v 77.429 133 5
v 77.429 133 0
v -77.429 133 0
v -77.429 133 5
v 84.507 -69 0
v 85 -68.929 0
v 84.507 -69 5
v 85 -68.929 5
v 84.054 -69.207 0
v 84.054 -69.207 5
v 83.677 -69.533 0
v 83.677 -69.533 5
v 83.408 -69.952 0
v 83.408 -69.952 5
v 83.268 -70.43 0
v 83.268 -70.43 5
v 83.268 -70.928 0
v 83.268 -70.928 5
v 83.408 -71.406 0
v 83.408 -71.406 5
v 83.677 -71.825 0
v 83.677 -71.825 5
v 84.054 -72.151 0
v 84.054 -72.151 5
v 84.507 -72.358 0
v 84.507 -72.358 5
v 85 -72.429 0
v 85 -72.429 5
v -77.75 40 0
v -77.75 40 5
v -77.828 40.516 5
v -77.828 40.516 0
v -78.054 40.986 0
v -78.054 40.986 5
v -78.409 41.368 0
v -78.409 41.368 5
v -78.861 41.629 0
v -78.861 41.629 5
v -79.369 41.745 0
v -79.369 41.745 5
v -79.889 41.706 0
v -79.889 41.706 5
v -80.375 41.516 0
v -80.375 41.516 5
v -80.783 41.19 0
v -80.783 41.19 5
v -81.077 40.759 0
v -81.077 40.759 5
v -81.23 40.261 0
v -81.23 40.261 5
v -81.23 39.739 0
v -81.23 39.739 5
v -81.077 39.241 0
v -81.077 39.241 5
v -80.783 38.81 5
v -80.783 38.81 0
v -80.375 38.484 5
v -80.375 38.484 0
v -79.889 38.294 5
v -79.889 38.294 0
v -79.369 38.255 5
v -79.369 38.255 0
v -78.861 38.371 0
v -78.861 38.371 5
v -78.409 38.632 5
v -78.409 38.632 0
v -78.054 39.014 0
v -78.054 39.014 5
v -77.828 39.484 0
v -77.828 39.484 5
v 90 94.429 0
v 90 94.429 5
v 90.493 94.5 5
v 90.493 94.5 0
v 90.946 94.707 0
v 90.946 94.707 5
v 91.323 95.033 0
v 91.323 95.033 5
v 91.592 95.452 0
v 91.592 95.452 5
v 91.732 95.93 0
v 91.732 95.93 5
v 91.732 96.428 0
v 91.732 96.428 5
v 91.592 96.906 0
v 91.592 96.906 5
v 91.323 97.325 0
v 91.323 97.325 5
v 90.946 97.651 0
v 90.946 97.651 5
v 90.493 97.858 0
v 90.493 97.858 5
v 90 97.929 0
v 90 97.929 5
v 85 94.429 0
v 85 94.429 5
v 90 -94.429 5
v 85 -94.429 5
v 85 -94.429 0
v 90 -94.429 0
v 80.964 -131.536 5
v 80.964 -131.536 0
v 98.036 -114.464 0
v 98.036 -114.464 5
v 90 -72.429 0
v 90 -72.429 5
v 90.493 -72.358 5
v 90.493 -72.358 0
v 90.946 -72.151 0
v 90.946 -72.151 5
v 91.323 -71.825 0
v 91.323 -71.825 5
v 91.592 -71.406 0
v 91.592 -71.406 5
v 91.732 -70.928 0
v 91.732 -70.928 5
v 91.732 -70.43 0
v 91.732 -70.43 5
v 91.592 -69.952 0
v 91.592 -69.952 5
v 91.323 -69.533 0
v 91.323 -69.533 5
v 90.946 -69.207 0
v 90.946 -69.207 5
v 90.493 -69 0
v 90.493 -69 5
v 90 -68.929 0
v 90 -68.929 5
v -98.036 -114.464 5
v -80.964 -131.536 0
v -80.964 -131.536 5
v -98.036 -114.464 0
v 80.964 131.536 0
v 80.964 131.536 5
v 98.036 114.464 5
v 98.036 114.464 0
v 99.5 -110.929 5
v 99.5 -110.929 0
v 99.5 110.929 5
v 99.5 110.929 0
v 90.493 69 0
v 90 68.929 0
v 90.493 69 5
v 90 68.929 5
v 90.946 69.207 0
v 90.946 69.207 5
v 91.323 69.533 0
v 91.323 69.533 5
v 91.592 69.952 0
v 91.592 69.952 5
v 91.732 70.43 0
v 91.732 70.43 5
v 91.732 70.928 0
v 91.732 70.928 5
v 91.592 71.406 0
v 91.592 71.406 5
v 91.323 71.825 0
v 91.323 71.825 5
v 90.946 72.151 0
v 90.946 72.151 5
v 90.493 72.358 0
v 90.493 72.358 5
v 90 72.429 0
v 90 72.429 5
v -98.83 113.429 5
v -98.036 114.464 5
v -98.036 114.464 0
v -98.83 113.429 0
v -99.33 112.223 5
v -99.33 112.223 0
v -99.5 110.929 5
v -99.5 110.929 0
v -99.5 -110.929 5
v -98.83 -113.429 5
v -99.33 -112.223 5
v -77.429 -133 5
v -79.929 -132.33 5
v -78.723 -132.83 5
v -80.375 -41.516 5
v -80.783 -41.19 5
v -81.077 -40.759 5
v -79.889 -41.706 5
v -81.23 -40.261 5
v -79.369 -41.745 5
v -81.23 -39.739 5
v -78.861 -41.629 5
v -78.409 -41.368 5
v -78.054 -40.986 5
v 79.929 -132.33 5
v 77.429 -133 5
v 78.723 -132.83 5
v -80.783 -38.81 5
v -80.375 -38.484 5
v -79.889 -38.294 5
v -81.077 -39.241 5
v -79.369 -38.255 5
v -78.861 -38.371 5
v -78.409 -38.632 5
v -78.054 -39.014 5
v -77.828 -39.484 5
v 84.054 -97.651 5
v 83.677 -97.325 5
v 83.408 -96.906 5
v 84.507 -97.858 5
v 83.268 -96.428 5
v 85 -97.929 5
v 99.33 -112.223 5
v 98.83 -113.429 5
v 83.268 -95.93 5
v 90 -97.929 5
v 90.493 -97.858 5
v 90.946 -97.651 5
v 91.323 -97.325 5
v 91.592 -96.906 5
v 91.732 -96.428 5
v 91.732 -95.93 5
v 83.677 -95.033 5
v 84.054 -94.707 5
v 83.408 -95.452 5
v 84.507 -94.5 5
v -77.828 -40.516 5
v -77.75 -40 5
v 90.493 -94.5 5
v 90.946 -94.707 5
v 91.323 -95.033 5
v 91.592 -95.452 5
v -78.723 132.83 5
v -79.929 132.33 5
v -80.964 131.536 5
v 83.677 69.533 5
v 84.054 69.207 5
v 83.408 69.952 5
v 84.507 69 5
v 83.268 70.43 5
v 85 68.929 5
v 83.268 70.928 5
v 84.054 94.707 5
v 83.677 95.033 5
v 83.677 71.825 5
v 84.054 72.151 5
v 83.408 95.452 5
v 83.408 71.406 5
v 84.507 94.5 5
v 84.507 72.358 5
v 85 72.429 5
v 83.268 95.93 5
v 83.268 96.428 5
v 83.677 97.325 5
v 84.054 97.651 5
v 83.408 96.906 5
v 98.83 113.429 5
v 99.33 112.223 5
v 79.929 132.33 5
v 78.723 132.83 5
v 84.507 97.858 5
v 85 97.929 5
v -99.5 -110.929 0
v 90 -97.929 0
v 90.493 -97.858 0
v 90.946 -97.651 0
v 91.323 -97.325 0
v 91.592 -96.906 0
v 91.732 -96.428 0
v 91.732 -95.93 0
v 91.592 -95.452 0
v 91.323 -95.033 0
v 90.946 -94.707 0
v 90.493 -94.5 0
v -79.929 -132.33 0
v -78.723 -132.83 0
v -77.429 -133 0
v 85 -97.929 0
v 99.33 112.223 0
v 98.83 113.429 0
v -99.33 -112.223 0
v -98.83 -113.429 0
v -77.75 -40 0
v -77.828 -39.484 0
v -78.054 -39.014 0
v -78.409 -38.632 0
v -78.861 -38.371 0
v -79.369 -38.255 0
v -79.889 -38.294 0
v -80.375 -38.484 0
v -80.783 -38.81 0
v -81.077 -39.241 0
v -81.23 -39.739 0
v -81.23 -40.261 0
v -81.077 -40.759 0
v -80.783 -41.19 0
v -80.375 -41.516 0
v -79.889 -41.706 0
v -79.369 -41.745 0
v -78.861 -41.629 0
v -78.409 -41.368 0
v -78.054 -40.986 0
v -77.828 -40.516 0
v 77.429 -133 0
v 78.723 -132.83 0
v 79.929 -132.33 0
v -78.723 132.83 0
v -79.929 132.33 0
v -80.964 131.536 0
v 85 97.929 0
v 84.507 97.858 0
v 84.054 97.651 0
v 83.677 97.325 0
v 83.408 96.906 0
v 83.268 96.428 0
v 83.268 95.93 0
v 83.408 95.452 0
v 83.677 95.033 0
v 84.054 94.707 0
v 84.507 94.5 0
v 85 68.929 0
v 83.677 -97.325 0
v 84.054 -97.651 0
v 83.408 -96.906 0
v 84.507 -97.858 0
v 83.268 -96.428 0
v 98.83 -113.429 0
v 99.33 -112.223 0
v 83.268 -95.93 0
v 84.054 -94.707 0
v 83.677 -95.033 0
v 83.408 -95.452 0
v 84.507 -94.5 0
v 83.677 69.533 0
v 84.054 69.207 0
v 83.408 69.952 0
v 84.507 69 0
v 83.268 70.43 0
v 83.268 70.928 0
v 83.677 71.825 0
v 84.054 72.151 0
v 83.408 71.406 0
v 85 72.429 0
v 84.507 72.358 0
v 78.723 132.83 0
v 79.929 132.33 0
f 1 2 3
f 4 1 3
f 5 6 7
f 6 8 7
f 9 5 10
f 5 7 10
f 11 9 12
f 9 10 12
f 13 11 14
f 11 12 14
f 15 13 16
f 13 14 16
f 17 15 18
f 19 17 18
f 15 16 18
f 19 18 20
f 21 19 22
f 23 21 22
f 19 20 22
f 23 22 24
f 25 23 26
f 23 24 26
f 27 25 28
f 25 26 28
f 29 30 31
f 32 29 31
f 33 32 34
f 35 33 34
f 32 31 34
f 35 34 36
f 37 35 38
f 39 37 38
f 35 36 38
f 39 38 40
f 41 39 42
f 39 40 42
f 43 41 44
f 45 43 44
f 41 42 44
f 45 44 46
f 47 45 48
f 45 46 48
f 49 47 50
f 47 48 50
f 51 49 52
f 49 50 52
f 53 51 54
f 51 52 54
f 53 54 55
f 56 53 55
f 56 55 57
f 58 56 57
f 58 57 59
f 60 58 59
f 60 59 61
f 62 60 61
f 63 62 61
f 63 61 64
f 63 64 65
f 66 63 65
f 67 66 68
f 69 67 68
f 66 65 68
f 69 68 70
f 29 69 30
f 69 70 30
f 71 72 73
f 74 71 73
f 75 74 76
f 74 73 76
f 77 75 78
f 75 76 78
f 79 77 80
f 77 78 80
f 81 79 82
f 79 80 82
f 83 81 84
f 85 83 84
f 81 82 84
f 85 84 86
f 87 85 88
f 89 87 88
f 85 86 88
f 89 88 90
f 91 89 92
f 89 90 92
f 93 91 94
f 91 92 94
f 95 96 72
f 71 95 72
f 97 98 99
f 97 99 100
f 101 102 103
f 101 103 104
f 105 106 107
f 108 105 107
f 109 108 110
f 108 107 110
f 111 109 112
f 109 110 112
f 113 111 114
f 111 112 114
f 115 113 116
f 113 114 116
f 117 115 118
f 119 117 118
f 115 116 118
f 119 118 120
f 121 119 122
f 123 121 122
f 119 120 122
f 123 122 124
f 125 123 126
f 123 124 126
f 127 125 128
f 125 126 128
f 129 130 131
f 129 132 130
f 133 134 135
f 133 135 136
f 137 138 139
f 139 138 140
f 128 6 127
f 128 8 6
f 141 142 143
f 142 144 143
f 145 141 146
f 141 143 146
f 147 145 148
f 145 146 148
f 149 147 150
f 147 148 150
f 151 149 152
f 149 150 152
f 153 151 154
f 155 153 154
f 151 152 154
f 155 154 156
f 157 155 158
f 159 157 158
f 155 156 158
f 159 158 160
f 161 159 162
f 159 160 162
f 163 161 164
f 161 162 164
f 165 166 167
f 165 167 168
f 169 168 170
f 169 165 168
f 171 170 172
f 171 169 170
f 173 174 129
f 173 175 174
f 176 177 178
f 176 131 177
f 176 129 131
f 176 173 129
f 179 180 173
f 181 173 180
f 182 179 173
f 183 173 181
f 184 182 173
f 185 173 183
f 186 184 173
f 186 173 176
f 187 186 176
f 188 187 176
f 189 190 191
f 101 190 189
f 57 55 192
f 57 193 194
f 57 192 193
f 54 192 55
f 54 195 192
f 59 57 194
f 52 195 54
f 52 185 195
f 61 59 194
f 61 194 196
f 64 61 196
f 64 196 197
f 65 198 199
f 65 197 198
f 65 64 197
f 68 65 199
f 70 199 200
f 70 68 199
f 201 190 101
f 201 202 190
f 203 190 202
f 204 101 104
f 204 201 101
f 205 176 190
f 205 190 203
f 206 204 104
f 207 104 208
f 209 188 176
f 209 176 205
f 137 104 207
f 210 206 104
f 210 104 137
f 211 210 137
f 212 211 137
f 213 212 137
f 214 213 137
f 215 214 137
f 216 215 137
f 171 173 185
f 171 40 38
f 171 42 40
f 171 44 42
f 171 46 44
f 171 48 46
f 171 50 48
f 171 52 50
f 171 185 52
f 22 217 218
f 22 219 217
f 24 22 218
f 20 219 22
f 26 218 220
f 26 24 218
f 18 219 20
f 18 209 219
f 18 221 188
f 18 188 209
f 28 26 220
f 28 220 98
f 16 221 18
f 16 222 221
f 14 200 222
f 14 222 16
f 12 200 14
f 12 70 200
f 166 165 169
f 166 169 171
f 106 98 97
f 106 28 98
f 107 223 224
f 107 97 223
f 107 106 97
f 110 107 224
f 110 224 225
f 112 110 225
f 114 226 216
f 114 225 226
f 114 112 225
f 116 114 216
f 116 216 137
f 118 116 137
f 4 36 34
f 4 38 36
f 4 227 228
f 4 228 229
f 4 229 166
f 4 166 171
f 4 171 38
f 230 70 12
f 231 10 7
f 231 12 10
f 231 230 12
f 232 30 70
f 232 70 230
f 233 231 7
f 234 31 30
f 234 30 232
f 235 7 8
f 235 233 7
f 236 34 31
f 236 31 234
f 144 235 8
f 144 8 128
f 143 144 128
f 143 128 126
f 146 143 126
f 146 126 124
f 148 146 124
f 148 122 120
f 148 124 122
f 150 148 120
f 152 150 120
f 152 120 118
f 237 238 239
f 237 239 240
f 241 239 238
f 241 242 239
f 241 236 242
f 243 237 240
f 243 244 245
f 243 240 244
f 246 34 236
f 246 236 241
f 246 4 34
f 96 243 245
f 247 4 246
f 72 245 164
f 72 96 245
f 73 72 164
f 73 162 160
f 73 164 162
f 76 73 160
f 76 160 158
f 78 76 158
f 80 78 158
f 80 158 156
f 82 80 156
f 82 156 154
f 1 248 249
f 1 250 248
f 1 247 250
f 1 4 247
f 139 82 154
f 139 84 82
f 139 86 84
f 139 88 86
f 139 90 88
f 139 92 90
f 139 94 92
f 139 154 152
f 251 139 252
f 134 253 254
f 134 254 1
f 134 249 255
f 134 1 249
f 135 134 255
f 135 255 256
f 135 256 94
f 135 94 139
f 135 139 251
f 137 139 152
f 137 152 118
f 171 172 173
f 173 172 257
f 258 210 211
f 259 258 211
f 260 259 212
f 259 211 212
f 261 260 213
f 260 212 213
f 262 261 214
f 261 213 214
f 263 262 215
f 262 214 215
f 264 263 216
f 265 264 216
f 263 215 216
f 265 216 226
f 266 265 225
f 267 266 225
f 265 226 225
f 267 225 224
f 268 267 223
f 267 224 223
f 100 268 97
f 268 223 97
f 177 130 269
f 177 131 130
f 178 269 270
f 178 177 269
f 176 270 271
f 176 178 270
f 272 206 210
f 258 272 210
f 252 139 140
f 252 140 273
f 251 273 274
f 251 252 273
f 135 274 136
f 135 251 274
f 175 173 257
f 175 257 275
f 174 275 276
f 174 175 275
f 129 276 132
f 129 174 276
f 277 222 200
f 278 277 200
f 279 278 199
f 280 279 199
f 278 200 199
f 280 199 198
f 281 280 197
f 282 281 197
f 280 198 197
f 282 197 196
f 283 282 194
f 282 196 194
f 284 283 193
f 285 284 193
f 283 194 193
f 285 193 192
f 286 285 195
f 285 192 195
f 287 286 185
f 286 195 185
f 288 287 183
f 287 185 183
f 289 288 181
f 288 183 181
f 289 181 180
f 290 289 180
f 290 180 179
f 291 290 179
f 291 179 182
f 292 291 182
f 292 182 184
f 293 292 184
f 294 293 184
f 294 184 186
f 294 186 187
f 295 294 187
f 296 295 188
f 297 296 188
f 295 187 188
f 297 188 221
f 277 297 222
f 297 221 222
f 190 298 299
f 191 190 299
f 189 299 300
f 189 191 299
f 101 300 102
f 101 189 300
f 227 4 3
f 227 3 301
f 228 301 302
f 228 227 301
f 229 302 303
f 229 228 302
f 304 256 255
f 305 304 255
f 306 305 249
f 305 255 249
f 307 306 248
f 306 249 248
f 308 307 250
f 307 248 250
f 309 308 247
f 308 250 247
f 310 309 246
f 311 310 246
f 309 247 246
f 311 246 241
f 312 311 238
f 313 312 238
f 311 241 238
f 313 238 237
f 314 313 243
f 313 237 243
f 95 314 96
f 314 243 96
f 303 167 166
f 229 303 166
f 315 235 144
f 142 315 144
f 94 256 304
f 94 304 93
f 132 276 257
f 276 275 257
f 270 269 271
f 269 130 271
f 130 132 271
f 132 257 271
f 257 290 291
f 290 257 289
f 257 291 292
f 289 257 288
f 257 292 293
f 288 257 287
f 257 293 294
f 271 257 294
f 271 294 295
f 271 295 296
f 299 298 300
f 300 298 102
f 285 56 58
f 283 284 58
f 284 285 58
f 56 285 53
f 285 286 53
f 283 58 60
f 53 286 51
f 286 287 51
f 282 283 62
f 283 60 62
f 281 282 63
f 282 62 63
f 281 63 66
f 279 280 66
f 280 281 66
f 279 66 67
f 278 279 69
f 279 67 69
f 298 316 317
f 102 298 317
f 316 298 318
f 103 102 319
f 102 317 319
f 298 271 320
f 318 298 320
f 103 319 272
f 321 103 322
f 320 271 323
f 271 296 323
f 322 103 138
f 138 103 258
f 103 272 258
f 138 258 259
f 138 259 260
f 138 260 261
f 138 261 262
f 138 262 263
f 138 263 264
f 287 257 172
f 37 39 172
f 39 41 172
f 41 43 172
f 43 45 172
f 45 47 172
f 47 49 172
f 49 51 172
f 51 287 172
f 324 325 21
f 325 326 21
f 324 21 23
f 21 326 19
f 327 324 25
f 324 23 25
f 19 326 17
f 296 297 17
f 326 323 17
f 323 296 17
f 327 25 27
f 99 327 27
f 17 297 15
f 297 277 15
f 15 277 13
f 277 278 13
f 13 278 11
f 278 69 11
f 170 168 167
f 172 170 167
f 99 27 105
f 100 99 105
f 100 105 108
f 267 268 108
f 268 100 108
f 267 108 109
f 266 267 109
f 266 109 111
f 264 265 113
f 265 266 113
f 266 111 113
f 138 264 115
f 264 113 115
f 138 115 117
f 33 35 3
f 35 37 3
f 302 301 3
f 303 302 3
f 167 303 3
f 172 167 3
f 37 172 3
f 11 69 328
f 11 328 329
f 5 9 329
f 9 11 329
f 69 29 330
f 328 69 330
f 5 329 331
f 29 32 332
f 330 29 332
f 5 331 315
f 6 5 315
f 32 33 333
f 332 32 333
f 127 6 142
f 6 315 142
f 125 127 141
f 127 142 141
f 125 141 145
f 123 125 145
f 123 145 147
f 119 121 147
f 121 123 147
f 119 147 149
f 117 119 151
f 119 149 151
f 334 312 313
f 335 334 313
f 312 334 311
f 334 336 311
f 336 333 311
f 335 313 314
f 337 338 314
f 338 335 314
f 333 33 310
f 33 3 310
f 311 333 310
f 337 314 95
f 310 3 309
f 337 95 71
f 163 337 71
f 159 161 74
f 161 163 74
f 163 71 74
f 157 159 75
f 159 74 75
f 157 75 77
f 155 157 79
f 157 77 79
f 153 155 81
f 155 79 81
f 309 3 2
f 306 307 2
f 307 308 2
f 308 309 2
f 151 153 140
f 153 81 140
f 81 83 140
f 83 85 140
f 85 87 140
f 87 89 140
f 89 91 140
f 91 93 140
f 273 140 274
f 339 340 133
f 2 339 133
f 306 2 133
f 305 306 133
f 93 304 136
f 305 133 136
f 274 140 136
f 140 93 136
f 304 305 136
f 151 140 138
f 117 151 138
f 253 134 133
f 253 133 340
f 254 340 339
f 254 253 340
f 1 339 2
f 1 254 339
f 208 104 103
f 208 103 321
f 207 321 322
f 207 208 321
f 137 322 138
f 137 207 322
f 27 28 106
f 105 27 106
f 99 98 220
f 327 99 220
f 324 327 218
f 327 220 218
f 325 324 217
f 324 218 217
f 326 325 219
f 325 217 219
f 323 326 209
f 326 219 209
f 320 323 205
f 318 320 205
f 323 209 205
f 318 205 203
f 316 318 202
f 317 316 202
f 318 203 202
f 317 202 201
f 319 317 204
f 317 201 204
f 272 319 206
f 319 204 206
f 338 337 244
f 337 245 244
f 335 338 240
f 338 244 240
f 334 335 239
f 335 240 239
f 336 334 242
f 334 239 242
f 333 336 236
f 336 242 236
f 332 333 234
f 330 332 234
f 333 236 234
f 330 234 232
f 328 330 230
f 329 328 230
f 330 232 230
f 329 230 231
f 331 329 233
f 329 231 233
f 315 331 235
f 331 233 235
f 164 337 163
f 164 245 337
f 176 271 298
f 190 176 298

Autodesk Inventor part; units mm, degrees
ref_plane "YZ Plane" through (0, 0, 0) normal (1, 0, 0) x (0, 1, 0)
ref_plane "XZ Plane" through (0, 0, 0) normal (0, 1, 0) x (-1, 0, 0)
ref_plane "XY Plane" through (0, 0, 0) normal (0, 0, 1) x (1, 0, 0)
sketch "Hinges Screw Holes" plane through (0, 0, 0) normal (0, 0, 1) x (1, 0, 0)
  arc A0 (172, -72.429) -> (172, -68.929) centre (172, -70.679) ccw
  arc A1 (172, -97.929) -> (172, -94.429) centre (172, -96.179) ccw
  arc A2 (167, 97.929) -> (167, 94.429) centre (167, 96.179) ccw
  arc A3 (167, 72.429) -> (167, 68.929) centre (167, 70.679) ccw
  arc A4 (167, -68.929) -> (167, -72.429) centre (167, -70.679) ccw
  arc A5 (167, -94.429) -> (167, -97.929) centre (167, -96.179) ccw
  line L0 (167, 97.929) -> (172, 97.929)
  line L1 (167, 94.429) -> (172, 94.429)
  line L2 (167, 72.429) -> (172, 72.429)
  line L3 (167, 68.929) -> (172, 68.929)
  line L4 (167, -68.929) -> (172, -68.929)
  line L5 (167, -72.429) -> (172, -72.429)
  line L6 (167, -94.429) -> (172, -94.429)
  line L7 (167, -97.929) -> (172, -97.929)
  arc A6 (172, 94.429) -> (172, 97.929) centre (172, 96.179) ccw
  arc A7 (172, 68.929) -> (172, 72.429) centre (172, 70.679) ccw
  point P0 (169.5, 0)
  dimension "d28" = 3.5
  dimension "d29" = 3.5
  dimension "d30" = 25.5
  dimension "d31" = 3.5
  dimension "d32" = 3.5
  dimension "d33" = 25.5
  dimension "d34" = 141.358
  dimension "d35" = 3.5
  dimension "d36" = 3.5
  dimension "d37" = 25.5
  dimension "d38" = 3.5
  dimension "d39" = 3.5
  dimension "d40" = 25.5
  dimension "d41" = 141.358
  dimension "d42" = 5
sketch "Handle-Hole" plane through (0, 0, 0) normal (0, 0, 1) x (1, 0, 0)
  line L0 (-99.5, 50) -> (-69.5, 50)
  line L1 (-69.5, 50) -> (-69.5, -50)
  line L2 (-69.5, -50) -> (-99.5, -50)
  line L3 (-99.5, -50) -> (-99.5, 50)
  circle A0 centre (-87.5, 62) radius 1.75
  circle A1 centre (-57.5, 27.5) radius 1.75
  circle A2 centre (-57.5, -27.5) radius 1.75
  circle A3 centre (-87.5, -62) radius 1.75
  point P0 (-82.2826, 0)
  point P1 (-99.5, 0)
  point P2 (-99.5, 0)
  dimension "d11" = 30
  dimension "d12" = 100
  dimension "d13" = 3.5
  dimension "d14" = 3.5
  dimension "d15" = 3.5
  dimension "d16" = 3.5
  dimension "d17" = 55
  dimension "d19" = 12
  dimension "d20" = 12
  dimension "d22" = 12
sketch "Sketch1" plane through (0, 0, 0) normal (0, 0, 1) x (1, 0, 0)
  line L0 (-100, 133.5) -> (100, 133.5)
  line L1 (100, 133.5) -> (100, -133.5)
  line L2 (100, -133.5) -> (-100, -133.5)
  line L3 (-100, -133.5) -> (-100, 133.5)
  line L4 (99.5, 133) -> (-99.5, 133)
  line L5 (-99.5, 133) -> (-99.5, -133)
  line L6 (-99.5, -133) -> (99.5, -133)
  line L7 (99.5, -133) -> (99.5, 133)
  point P0 (0, 0)
  point P1 (0, 133.5)
  point P2 (-99.5, 0)
  dimension "d0" = 200
  dimension "d1" = 267
  dimension "d4" = 0.5
extrude "Extrusion1" add sketch "Sketch1" along normal blind 5 contours L7 L6 L5 L4
chamfer "Chamfer1" distance 20 angle 45 4 edges at (-99.5, -133, 2.5) (-99.5, 133, 2.5) (99.5, -133, 2.5) (99.5, 133, 2.5)
fillet "Fillet1" radius 5 8 edges at (-79.5, -133, 2.5) (79.5, -133, 2.5) (99.5, -113, 2.5) (99.5, 113, 2.5) (79.5, 133, 2.5) (-79.5, 133, 2.5) (-99.5, 113, 2.5) (-99.5, -113, 2.5)
sketch "Sketch2" plane through (0, 0, 5) normal (0, 0, 1) x (1, 0, 0)
  line L0 (99.5, -110.9289) -> (99.5, 110.9289) projected
  circle A0 centre (-79.5, 40) radius 1.75
  circle A1 centre (-79.5, -40) radius 1.75
  line L1 (-99.5, 110.9289) -> (-99.5, -110.9289) projected
  arc A2 (90, -72.429) -> (90, -68.929) centre (90, -70.679) ccw
  arc A3 (90, -97.929) -> (90, -94.429) centre (90, -96.179) ccw
  arc A4 (85, 97.929) -> (85, 94.429) centre (85, 96.179) ccw
  arc A5 (85, 72.429) -> (85, 68.929) centre (85, 70.679) ccw
  arc A6 (85, -68.929) -> (85, -72.429) centre (85, -70.679) ccw
  arc A7 (85, -94.429) -> (85, -97.929) centre (85, -96.179) ccw
  line L2 (85, 97.929) -> (90, 97.929)
  line L3 (85, 94.429) -> (90, 94.429)
  line L4 (85, 72.429) -> (90, 72.429)
  line L5 (85, 68.929) -> (90, 68.929)
  line L6 (85, -68.929) -> (90, -68.929)
  line L7 (85, -72.429) -> (90, -72.429)
  line L8 (85, -94.429) -> (90, -94.429)
  line L9 (85, -97.929) -> (90, -97.929)
  arc A8 (90, 94.429) -> (90, 97.929) centre (90, 96.179) ccw
  arc A9 (90, 68.929) -> (90, 72.429) centre (90, 70.679) ccw
  point P0 (0, 0)
  point P1 (0, 0)
  dimension "d43" = 141.358
  dimension "d44" = 70.679
  dimension "d45" = 9.5
  dimension "d46" = 9.5
  dimension "d47" = 3.5
  dimension "d48" = 80
  dimension "d49" = 20
  dimension "d50" = 40
extrude "Extrusion2" cut sketch "Sketch2" against normal blind 10
equation "\"d44\" = 0.5 * d43"
equation "\"d50\" = 0.5 * d48"
equation "\"d19\" = d20"
equation "\"d20\" = d21"
equation "\"d22\" = d21"
equation "\"d46\" = d45"
equation "\"d21\" = 12"
properties part number "Clear Right Side Door" material "Glass"
